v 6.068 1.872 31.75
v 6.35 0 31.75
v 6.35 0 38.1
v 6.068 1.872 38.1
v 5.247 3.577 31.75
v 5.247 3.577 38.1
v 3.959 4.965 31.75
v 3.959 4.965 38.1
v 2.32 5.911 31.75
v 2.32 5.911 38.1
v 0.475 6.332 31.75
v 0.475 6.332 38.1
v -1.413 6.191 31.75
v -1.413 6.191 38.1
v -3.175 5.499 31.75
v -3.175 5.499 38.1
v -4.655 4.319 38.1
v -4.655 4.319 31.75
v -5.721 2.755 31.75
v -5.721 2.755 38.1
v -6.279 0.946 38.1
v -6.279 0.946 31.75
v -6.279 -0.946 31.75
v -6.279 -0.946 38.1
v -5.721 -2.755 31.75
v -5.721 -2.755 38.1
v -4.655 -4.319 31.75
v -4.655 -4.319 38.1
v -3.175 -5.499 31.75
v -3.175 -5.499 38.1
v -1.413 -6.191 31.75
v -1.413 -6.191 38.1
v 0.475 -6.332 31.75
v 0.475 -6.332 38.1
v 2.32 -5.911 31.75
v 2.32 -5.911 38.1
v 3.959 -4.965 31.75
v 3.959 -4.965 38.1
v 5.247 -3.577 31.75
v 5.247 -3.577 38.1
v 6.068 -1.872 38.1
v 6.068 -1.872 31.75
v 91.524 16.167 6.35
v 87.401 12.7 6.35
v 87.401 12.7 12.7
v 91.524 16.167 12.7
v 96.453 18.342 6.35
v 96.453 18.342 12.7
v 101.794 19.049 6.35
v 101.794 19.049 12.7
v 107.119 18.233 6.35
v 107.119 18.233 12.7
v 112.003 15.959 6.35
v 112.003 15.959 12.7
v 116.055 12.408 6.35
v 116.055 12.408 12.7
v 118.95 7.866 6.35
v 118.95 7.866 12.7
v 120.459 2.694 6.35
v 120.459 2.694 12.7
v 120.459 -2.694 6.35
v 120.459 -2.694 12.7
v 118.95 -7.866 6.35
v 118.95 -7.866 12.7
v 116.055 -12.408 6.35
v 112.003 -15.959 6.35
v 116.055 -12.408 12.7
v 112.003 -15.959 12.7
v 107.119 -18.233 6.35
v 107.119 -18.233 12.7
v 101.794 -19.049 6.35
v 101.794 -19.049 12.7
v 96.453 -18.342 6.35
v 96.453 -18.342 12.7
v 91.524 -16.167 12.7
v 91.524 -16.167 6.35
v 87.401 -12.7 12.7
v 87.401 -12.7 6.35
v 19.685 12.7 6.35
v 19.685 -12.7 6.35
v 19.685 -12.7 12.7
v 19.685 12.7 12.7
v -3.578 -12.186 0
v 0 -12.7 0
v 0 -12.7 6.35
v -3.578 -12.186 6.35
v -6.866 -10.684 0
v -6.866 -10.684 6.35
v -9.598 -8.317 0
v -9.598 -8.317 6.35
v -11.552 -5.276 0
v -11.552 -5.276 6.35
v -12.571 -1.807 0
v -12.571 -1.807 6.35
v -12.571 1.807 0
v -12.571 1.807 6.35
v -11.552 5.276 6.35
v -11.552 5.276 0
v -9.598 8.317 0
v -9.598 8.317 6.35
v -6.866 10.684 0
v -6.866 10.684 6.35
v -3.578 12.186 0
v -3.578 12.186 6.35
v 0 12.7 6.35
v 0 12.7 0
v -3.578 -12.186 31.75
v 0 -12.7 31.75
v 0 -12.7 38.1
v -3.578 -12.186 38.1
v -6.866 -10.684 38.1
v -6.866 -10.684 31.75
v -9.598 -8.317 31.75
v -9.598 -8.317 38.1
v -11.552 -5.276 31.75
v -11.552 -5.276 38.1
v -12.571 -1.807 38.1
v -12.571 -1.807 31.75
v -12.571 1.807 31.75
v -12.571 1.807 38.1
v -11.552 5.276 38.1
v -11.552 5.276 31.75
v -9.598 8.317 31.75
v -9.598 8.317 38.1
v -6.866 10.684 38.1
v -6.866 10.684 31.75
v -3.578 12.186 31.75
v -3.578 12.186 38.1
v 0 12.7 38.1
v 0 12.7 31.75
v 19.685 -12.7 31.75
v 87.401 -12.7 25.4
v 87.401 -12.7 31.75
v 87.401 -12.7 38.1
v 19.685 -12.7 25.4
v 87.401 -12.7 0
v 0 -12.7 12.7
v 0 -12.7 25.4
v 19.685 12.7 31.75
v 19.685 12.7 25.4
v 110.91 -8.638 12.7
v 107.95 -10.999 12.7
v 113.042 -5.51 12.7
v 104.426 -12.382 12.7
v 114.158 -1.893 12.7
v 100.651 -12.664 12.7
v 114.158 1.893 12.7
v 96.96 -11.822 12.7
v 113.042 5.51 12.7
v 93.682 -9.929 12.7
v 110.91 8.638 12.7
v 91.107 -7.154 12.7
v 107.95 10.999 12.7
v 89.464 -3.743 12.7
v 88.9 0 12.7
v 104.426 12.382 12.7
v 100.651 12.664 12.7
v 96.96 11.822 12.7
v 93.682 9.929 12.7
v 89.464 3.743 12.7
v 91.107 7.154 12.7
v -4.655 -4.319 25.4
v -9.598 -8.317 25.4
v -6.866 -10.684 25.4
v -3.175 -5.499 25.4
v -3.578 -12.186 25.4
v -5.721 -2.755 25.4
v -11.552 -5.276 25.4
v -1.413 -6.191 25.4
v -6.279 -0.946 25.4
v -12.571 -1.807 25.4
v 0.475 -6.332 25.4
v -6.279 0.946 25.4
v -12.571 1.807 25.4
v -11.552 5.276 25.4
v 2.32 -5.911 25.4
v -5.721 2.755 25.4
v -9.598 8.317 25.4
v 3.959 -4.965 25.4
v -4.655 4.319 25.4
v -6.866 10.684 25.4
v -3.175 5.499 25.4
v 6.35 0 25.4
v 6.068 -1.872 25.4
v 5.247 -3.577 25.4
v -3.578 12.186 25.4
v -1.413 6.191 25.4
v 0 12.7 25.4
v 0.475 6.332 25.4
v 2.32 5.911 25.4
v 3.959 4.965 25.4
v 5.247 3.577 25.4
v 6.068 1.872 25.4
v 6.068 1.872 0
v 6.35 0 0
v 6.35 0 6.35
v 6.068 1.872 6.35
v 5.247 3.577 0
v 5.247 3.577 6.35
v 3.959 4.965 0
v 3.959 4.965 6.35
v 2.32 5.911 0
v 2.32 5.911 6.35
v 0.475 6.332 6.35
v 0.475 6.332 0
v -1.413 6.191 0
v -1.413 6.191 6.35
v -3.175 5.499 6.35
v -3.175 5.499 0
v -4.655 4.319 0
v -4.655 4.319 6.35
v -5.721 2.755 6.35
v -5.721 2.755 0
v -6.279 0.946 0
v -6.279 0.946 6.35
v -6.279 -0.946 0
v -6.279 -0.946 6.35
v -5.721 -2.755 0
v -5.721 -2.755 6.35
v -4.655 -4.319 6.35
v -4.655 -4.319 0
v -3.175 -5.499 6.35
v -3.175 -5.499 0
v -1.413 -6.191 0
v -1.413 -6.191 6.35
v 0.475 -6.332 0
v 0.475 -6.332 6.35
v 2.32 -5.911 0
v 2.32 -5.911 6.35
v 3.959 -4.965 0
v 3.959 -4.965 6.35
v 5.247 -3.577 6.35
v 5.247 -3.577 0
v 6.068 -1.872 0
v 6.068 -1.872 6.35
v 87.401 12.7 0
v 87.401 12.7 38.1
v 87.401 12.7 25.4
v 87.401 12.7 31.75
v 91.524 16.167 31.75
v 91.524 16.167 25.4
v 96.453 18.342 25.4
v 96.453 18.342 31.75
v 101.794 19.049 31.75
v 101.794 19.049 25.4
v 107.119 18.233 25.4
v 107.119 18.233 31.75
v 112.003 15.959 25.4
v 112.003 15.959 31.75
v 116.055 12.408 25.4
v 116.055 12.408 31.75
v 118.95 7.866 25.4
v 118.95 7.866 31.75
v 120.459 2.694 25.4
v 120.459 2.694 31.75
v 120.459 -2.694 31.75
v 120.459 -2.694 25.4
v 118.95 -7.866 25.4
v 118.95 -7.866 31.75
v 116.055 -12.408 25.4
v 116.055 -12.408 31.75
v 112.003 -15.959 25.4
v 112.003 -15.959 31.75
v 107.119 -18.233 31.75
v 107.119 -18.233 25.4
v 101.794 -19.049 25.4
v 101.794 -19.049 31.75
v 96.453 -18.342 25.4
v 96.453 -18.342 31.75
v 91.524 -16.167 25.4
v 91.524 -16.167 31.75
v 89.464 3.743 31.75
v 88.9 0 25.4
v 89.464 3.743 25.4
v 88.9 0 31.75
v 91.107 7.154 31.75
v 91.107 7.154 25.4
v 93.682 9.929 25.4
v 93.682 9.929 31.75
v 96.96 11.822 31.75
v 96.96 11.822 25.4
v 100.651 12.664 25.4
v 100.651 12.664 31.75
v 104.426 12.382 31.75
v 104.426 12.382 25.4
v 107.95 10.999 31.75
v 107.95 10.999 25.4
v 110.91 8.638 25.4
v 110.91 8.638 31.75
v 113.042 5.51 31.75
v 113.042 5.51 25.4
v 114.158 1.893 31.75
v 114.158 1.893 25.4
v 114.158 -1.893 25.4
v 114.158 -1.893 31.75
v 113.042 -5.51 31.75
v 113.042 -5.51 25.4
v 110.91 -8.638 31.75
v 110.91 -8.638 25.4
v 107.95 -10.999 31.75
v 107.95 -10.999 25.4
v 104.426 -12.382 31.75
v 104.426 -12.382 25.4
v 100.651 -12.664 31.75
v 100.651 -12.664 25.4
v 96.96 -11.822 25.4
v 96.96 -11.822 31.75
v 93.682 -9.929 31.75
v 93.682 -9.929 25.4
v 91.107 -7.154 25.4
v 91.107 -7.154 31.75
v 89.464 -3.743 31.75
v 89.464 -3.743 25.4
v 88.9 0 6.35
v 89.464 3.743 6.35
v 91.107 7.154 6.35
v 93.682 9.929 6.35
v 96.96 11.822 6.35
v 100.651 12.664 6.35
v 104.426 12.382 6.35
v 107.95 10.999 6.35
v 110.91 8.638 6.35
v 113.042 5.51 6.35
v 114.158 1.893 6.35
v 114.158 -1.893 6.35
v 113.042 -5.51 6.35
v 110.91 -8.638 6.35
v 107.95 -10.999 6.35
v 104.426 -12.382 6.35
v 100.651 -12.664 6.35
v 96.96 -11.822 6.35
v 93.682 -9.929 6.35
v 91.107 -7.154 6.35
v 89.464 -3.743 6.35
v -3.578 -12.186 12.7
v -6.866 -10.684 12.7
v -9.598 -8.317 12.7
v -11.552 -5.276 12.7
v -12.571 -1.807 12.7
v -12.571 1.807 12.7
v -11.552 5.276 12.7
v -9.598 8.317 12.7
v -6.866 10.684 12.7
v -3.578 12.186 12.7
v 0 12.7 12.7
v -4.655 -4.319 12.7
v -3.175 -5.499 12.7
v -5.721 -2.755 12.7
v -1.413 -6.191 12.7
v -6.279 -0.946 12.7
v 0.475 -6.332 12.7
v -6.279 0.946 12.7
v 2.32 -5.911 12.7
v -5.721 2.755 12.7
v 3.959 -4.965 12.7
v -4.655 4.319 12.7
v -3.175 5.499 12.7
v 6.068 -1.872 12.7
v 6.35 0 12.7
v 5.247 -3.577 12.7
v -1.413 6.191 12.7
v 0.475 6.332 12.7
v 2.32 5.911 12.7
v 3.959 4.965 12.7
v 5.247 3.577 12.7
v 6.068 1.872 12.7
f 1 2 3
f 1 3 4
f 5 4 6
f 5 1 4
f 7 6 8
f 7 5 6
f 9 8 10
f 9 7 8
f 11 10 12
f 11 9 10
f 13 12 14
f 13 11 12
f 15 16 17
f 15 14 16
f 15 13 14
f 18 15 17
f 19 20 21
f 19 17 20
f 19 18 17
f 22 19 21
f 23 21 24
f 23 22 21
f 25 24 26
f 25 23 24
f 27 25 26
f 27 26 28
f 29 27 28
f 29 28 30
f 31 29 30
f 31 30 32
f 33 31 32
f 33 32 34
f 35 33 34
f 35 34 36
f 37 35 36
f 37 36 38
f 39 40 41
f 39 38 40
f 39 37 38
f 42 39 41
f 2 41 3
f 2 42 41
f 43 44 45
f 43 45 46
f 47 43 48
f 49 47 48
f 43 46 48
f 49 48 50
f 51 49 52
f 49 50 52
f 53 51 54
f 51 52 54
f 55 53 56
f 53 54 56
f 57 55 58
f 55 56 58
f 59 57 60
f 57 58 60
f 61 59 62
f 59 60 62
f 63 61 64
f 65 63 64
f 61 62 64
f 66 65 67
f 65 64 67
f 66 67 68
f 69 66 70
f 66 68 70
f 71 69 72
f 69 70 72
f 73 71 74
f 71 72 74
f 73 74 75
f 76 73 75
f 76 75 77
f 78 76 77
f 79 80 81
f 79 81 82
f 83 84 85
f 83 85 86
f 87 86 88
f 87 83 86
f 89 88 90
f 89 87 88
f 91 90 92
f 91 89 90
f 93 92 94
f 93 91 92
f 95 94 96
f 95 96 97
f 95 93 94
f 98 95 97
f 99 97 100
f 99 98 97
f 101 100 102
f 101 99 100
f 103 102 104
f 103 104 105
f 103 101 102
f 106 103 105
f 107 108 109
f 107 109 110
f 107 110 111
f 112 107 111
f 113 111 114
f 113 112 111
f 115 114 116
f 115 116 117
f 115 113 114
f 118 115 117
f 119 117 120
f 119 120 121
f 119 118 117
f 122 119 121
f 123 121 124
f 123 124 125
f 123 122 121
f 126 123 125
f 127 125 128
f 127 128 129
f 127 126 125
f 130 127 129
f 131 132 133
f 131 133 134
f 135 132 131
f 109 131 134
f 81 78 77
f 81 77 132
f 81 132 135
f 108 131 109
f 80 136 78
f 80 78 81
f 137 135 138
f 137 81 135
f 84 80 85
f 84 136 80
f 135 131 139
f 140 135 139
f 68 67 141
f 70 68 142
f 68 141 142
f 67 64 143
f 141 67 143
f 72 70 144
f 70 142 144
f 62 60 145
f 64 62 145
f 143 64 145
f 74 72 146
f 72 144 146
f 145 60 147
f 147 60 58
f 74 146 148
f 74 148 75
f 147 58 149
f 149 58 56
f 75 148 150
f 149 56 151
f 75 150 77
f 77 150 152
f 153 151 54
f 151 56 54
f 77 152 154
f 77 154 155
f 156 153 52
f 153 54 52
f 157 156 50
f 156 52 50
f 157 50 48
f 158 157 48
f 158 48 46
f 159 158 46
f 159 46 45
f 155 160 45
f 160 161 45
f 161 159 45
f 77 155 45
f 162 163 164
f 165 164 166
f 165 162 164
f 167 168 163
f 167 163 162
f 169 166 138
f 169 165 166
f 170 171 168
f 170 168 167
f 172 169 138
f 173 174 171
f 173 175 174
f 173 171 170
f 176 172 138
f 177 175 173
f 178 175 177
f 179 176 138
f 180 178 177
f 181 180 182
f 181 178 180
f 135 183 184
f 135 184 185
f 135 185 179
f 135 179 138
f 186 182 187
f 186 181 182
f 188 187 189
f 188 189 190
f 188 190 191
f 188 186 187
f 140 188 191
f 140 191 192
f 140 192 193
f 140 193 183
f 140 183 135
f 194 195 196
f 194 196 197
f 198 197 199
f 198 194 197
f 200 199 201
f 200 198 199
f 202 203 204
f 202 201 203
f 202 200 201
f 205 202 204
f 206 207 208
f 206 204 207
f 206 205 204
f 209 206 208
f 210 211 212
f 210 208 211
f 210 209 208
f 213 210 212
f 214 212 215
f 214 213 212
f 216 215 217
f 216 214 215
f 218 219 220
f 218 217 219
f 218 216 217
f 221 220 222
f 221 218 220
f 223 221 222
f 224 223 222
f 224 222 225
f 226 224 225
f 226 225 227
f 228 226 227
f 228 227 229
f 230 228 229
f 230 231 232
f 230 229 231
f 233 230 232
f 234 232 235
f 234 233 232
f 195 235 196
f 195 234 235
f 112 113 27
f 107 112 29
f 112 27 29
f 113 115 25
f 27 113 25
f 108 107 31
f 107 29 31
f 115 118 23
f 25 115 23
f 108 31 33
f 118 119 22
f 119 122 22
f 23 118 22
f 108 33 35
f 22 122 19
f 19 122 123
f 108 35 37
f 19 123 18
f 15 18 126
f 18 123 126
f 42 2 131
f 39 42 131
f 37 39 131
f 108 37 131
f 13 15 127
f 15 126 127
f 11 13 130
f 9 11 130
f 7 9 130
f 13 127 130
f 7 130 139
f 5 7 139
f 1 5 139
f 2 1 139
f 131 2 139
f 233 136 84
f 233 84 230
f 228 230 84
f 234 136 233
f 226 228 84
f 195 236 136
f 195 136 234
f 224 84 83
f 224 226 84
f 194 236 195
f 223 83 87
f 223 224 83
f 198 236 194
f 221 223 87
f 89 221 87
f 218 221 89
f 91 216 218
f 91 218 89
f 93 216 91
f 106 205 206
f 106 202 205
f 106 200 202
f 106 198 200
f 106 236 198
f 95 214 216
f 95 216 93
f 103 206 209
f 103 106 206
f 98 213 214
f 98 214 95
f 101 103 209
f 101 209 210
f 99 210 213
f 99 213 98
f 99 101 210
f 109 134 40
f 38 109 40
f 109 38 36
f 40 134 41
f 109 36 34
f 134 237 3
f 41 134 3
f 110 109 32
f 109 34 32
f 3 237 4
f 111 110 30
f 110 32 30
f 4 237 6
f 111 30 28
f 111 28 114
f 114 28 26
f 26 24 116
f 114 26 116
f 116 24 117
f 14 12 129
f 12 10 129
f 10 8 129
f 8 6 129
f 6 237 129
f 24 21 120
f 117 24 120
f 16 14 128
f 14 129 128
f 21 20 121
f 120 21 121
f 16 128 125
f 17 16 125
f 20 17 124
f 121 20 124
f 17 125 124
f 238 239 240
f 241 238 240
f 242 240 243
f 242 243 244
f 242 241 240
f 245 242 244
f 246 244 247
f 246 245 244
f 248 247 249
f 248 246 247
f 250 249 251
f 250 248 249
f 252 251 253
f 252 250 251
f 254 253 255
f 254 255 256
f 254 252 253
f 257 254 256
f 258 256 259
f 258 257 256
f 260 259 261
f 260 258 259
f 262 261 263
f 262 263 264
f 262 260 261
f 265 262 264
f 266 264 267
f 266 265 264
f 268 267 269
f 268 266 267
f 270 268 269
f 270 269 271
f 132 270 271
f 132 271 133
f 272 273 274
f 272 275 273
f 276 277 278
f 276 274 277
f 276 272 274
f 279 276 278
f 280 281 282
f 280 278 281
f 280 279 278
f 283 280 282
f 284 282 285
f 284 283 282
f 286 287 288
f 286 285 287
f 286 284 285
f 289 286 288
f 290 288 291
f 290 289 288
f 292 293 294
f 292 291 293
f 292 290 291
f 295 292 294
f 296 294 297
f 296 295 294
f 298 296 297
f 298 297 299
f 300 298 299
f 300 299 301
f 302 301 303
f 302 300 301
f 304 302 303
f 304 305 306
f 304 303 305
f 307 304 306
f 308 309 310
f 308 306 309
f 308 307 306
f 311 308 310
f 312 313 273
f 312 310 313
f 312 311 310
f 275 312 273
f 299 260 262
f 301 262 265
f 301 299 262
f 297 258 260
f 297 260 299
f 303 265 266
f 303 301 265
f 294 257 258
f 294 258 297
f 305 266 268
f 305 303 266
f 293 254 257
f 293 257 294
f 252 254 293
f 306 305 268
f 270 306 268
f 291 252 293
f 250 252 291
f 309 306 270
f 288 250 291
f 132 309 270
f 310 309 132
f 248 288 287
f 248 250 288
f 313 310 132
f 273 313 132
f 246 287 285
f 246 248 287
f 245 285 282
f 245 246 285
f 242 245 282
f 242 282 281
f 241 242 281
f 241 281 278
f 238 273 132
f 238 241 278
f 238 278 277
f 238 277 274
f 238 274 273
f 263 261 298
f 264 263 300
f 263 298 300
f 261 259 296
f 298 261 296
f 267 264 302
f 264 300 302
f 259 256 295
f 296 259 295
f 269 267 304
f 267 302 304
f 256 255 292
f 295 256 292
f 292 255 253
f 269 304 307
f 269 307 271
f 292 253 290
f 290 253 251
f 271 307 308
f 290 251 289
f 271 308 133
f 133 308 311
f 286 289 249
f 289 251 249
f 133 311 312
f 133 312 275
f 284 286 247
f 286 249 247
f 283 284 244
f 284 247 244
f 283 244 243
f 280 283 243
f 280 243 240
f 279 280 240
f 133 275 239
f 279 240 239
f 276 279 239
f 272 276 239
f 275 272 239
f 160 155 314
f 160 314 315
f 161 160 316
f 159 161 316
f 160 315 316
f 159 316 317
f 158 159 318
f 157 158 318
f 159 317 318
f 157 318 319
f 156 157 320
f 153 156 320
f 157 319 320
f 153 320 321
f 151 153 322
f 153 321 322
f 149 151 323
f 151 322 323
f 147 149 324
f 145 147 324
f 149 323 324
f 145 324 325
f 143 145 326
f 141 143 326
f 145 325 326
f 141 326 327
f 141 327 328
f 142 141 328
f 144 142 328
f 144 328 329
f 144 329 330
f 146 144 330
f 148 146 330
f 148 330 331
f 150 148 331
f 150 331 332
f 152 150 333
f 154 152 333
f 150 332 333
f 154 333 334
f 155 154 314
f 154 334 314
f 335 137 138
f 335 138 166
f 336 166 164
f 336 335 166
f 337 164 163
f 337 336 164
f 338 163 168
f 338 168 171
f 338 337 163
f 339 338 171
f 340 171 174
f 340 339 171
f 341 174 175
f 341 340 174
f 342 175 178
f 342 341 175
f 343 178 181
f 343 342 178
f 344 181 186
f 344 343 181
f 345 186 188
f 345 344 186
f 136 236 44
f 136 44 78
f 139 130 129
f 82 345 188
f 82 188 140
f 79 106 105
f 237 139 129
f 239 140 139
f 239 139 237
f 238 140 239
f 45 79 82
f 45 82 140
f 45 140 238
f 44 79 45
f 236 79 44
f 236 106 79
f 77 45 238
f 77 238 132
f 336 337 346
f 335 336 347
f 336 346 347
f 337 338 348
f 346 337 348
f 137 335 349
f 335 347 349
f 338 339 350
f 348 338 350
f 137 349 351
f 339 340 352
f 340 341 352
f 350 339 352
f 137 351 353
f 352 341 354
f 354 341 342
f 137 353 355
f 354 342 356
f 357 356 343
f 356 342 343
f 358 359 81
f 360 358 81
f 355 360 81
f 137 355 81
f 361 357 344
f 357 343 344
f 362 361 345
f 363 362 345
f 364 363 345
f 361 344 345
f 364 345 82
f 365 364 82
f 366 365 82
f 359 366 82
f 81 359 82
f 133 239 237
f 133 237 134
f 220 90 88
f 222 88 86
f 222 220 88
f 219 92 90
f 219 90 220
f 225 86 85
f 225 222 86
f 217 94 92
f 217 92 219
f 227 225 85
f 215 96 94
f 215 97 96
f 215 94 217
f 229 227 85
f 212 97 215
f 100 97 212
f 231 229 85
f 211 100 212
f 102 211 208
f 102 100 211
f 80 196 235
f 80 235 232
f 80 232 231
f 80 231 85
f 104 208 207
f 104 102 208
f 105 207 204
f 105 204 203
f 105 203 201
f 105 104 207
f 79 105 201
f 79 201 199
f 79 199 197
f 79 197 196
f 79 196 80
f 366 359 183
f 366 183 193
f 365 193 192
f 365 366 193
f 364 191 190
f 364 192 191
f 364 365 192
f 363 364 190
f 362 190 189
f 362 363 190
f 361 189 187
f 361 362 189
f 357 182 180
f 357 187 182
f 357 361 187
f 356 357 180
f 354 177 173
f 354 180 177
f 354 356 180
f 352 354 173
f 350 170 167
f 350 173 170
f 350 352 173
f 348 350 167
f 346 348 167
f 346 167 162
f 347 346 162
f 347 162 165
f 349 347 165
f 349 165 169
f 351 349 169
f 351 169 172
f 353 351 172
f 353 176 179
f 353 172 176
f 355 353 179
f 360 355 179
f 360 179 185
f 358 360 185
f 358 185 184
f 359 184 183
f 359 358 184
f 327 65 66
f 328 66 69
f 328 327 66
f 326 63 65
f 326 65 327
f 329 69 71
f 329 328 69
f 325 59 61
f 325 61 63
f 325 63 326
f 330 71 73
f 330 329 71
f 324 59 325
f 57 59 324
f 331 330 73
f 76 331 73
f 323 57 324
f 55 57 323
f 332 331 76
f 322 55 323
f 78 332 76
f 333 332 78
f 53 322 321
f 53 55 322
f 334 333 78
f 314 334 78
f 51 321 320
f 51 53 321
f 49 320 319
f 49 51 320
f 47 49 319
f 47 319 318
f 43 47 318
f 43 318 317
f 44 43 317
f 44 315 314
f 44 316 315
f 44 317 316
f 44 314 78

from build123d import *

# Parameters (mm, degrees)
BOSS_EXTRUDE1_DEPTH     = 38.1
CUT_EXTRUDE1_START      = 6.35
CUT_EXTRUDE1_DEPTH      = 6.35
CUT_EXTRUDE2_DEPTH      = 97.186429746
CUT_EXTRUDE2_DEPTH_BACK = 97.186429746
SKETCH3_R               = 6.35
BOSS_EXTRUDE2_START     = 6.35
SKETCH6_R               = 19.05
BOSS_EXTRUDE2_DEPTH     = 6.35
SKETCH7_R               = 12.7
CUT_EXTRUDE5_DEPTH      = 127.203753906


with BuildPart() as part:
    # Sketch1 → Boss-Extrude1 (new body)
    with BuildSketch(Plane.XY):
        with BuildLine():
            Line((0, 12.7), (87.400968343, 12.7))
            Line((87.400968343, 12.7), (87.400968343, -12.7))
            Line((87.400968343, -12.7), (0, -12.7))
            ThreePointArc((0, -12.7), (-12.7, 0), (0, 12.7))
        make_face()
    extrude(amount=BOSS_EXTRUDE1_DEPTH)

    # Sketch2 → Cut-Extrude1 (cut)
    with BuildSketch(Plane.XY.offset(CUT_EXTRUDE1_START)):
        with BuildLine():
            Line((0, -19.685), (19.685, -19.685))
            Line((19.685, -19.685), (19.685, 19.685))
            Line((19.685, 19.685), (0, 19.685))
            ThreePointArc((0, 19.685), (-19.685, 0), (0, -19.685))
        make_face()
    cut_extrude1 = extrude(amount=CUT_EXTRUDE1_DEPTH, mode=Mode.SUBTRACT)

    # Mirror1: Cut-Extrude1 across plane
    add(cut_extrude1.mirror(Plane(origin=(0, 0, 19.05), x_dir=(1, 0, 0), z_dir=(0, 0, -1))), mode=Mode.SUBTRACT)

    # Sketch3 → Cut-Extrude2 (cut, two sides: drawn at the far end of the back side and taken through both)
    with BuildSketch(Plane.XY.offset(38.1).offset(-CUT_EXTRUDE2_DEPTH_BACK)):
        Circle(SKETCH3_R)
    extrude(amount=CUT_EXTRUDE2_DEPTH + CUT_EXTRUDE2_DEPTH_BACK, mode=Mode.SUBTRACT)

    # Sketch6 → Boss-Extrude2 (add)
    with BuildSketch(Plane(origin=(0, 0, 19.05), x_dir=(-1, 0, 0), z_dir=(0, 0, -1)).offset(BOSS_EXTRUDE2_START)):
        with Locations((-101.6, 0)):
            Circle(SKETCH6_R)
    boss_extrude2 = extrude(amount=BOSS_EXTRUDE2_DEPTH)

    # Sketch7 → Cut-Extrude5 (cut, symmetric)
    with BuildSketch(Plane(origin=(0, 0, 6.35), x_dir=(-1, 0, 0), z_dir=(0, 0, -1))):
        with Locations((-101.6, 0)):
            Circle(SKETCH7_R)
    cut_extrude5 = extrude(amount=CUT_EXTRUDE5_DEPTH, both=True, mode=Mode.SUBTRACT)

    # Mirror3: Boss-Extrude2, Cut-Extrude5 across plane
    add(boss_extrude2.mirror(Plane(origin=(0, 0, 19.05), x_dir=(1, 0, 0), z_dir=(0, 0, -1))))
    add(cut_extrude5.mirror(Plane(origin=(0, 0, 19.05), x_dir=(1, 0, 0), z_dir=(0, 0, -1))), mode=Mode.SUBTRACT)


solid = part.part
